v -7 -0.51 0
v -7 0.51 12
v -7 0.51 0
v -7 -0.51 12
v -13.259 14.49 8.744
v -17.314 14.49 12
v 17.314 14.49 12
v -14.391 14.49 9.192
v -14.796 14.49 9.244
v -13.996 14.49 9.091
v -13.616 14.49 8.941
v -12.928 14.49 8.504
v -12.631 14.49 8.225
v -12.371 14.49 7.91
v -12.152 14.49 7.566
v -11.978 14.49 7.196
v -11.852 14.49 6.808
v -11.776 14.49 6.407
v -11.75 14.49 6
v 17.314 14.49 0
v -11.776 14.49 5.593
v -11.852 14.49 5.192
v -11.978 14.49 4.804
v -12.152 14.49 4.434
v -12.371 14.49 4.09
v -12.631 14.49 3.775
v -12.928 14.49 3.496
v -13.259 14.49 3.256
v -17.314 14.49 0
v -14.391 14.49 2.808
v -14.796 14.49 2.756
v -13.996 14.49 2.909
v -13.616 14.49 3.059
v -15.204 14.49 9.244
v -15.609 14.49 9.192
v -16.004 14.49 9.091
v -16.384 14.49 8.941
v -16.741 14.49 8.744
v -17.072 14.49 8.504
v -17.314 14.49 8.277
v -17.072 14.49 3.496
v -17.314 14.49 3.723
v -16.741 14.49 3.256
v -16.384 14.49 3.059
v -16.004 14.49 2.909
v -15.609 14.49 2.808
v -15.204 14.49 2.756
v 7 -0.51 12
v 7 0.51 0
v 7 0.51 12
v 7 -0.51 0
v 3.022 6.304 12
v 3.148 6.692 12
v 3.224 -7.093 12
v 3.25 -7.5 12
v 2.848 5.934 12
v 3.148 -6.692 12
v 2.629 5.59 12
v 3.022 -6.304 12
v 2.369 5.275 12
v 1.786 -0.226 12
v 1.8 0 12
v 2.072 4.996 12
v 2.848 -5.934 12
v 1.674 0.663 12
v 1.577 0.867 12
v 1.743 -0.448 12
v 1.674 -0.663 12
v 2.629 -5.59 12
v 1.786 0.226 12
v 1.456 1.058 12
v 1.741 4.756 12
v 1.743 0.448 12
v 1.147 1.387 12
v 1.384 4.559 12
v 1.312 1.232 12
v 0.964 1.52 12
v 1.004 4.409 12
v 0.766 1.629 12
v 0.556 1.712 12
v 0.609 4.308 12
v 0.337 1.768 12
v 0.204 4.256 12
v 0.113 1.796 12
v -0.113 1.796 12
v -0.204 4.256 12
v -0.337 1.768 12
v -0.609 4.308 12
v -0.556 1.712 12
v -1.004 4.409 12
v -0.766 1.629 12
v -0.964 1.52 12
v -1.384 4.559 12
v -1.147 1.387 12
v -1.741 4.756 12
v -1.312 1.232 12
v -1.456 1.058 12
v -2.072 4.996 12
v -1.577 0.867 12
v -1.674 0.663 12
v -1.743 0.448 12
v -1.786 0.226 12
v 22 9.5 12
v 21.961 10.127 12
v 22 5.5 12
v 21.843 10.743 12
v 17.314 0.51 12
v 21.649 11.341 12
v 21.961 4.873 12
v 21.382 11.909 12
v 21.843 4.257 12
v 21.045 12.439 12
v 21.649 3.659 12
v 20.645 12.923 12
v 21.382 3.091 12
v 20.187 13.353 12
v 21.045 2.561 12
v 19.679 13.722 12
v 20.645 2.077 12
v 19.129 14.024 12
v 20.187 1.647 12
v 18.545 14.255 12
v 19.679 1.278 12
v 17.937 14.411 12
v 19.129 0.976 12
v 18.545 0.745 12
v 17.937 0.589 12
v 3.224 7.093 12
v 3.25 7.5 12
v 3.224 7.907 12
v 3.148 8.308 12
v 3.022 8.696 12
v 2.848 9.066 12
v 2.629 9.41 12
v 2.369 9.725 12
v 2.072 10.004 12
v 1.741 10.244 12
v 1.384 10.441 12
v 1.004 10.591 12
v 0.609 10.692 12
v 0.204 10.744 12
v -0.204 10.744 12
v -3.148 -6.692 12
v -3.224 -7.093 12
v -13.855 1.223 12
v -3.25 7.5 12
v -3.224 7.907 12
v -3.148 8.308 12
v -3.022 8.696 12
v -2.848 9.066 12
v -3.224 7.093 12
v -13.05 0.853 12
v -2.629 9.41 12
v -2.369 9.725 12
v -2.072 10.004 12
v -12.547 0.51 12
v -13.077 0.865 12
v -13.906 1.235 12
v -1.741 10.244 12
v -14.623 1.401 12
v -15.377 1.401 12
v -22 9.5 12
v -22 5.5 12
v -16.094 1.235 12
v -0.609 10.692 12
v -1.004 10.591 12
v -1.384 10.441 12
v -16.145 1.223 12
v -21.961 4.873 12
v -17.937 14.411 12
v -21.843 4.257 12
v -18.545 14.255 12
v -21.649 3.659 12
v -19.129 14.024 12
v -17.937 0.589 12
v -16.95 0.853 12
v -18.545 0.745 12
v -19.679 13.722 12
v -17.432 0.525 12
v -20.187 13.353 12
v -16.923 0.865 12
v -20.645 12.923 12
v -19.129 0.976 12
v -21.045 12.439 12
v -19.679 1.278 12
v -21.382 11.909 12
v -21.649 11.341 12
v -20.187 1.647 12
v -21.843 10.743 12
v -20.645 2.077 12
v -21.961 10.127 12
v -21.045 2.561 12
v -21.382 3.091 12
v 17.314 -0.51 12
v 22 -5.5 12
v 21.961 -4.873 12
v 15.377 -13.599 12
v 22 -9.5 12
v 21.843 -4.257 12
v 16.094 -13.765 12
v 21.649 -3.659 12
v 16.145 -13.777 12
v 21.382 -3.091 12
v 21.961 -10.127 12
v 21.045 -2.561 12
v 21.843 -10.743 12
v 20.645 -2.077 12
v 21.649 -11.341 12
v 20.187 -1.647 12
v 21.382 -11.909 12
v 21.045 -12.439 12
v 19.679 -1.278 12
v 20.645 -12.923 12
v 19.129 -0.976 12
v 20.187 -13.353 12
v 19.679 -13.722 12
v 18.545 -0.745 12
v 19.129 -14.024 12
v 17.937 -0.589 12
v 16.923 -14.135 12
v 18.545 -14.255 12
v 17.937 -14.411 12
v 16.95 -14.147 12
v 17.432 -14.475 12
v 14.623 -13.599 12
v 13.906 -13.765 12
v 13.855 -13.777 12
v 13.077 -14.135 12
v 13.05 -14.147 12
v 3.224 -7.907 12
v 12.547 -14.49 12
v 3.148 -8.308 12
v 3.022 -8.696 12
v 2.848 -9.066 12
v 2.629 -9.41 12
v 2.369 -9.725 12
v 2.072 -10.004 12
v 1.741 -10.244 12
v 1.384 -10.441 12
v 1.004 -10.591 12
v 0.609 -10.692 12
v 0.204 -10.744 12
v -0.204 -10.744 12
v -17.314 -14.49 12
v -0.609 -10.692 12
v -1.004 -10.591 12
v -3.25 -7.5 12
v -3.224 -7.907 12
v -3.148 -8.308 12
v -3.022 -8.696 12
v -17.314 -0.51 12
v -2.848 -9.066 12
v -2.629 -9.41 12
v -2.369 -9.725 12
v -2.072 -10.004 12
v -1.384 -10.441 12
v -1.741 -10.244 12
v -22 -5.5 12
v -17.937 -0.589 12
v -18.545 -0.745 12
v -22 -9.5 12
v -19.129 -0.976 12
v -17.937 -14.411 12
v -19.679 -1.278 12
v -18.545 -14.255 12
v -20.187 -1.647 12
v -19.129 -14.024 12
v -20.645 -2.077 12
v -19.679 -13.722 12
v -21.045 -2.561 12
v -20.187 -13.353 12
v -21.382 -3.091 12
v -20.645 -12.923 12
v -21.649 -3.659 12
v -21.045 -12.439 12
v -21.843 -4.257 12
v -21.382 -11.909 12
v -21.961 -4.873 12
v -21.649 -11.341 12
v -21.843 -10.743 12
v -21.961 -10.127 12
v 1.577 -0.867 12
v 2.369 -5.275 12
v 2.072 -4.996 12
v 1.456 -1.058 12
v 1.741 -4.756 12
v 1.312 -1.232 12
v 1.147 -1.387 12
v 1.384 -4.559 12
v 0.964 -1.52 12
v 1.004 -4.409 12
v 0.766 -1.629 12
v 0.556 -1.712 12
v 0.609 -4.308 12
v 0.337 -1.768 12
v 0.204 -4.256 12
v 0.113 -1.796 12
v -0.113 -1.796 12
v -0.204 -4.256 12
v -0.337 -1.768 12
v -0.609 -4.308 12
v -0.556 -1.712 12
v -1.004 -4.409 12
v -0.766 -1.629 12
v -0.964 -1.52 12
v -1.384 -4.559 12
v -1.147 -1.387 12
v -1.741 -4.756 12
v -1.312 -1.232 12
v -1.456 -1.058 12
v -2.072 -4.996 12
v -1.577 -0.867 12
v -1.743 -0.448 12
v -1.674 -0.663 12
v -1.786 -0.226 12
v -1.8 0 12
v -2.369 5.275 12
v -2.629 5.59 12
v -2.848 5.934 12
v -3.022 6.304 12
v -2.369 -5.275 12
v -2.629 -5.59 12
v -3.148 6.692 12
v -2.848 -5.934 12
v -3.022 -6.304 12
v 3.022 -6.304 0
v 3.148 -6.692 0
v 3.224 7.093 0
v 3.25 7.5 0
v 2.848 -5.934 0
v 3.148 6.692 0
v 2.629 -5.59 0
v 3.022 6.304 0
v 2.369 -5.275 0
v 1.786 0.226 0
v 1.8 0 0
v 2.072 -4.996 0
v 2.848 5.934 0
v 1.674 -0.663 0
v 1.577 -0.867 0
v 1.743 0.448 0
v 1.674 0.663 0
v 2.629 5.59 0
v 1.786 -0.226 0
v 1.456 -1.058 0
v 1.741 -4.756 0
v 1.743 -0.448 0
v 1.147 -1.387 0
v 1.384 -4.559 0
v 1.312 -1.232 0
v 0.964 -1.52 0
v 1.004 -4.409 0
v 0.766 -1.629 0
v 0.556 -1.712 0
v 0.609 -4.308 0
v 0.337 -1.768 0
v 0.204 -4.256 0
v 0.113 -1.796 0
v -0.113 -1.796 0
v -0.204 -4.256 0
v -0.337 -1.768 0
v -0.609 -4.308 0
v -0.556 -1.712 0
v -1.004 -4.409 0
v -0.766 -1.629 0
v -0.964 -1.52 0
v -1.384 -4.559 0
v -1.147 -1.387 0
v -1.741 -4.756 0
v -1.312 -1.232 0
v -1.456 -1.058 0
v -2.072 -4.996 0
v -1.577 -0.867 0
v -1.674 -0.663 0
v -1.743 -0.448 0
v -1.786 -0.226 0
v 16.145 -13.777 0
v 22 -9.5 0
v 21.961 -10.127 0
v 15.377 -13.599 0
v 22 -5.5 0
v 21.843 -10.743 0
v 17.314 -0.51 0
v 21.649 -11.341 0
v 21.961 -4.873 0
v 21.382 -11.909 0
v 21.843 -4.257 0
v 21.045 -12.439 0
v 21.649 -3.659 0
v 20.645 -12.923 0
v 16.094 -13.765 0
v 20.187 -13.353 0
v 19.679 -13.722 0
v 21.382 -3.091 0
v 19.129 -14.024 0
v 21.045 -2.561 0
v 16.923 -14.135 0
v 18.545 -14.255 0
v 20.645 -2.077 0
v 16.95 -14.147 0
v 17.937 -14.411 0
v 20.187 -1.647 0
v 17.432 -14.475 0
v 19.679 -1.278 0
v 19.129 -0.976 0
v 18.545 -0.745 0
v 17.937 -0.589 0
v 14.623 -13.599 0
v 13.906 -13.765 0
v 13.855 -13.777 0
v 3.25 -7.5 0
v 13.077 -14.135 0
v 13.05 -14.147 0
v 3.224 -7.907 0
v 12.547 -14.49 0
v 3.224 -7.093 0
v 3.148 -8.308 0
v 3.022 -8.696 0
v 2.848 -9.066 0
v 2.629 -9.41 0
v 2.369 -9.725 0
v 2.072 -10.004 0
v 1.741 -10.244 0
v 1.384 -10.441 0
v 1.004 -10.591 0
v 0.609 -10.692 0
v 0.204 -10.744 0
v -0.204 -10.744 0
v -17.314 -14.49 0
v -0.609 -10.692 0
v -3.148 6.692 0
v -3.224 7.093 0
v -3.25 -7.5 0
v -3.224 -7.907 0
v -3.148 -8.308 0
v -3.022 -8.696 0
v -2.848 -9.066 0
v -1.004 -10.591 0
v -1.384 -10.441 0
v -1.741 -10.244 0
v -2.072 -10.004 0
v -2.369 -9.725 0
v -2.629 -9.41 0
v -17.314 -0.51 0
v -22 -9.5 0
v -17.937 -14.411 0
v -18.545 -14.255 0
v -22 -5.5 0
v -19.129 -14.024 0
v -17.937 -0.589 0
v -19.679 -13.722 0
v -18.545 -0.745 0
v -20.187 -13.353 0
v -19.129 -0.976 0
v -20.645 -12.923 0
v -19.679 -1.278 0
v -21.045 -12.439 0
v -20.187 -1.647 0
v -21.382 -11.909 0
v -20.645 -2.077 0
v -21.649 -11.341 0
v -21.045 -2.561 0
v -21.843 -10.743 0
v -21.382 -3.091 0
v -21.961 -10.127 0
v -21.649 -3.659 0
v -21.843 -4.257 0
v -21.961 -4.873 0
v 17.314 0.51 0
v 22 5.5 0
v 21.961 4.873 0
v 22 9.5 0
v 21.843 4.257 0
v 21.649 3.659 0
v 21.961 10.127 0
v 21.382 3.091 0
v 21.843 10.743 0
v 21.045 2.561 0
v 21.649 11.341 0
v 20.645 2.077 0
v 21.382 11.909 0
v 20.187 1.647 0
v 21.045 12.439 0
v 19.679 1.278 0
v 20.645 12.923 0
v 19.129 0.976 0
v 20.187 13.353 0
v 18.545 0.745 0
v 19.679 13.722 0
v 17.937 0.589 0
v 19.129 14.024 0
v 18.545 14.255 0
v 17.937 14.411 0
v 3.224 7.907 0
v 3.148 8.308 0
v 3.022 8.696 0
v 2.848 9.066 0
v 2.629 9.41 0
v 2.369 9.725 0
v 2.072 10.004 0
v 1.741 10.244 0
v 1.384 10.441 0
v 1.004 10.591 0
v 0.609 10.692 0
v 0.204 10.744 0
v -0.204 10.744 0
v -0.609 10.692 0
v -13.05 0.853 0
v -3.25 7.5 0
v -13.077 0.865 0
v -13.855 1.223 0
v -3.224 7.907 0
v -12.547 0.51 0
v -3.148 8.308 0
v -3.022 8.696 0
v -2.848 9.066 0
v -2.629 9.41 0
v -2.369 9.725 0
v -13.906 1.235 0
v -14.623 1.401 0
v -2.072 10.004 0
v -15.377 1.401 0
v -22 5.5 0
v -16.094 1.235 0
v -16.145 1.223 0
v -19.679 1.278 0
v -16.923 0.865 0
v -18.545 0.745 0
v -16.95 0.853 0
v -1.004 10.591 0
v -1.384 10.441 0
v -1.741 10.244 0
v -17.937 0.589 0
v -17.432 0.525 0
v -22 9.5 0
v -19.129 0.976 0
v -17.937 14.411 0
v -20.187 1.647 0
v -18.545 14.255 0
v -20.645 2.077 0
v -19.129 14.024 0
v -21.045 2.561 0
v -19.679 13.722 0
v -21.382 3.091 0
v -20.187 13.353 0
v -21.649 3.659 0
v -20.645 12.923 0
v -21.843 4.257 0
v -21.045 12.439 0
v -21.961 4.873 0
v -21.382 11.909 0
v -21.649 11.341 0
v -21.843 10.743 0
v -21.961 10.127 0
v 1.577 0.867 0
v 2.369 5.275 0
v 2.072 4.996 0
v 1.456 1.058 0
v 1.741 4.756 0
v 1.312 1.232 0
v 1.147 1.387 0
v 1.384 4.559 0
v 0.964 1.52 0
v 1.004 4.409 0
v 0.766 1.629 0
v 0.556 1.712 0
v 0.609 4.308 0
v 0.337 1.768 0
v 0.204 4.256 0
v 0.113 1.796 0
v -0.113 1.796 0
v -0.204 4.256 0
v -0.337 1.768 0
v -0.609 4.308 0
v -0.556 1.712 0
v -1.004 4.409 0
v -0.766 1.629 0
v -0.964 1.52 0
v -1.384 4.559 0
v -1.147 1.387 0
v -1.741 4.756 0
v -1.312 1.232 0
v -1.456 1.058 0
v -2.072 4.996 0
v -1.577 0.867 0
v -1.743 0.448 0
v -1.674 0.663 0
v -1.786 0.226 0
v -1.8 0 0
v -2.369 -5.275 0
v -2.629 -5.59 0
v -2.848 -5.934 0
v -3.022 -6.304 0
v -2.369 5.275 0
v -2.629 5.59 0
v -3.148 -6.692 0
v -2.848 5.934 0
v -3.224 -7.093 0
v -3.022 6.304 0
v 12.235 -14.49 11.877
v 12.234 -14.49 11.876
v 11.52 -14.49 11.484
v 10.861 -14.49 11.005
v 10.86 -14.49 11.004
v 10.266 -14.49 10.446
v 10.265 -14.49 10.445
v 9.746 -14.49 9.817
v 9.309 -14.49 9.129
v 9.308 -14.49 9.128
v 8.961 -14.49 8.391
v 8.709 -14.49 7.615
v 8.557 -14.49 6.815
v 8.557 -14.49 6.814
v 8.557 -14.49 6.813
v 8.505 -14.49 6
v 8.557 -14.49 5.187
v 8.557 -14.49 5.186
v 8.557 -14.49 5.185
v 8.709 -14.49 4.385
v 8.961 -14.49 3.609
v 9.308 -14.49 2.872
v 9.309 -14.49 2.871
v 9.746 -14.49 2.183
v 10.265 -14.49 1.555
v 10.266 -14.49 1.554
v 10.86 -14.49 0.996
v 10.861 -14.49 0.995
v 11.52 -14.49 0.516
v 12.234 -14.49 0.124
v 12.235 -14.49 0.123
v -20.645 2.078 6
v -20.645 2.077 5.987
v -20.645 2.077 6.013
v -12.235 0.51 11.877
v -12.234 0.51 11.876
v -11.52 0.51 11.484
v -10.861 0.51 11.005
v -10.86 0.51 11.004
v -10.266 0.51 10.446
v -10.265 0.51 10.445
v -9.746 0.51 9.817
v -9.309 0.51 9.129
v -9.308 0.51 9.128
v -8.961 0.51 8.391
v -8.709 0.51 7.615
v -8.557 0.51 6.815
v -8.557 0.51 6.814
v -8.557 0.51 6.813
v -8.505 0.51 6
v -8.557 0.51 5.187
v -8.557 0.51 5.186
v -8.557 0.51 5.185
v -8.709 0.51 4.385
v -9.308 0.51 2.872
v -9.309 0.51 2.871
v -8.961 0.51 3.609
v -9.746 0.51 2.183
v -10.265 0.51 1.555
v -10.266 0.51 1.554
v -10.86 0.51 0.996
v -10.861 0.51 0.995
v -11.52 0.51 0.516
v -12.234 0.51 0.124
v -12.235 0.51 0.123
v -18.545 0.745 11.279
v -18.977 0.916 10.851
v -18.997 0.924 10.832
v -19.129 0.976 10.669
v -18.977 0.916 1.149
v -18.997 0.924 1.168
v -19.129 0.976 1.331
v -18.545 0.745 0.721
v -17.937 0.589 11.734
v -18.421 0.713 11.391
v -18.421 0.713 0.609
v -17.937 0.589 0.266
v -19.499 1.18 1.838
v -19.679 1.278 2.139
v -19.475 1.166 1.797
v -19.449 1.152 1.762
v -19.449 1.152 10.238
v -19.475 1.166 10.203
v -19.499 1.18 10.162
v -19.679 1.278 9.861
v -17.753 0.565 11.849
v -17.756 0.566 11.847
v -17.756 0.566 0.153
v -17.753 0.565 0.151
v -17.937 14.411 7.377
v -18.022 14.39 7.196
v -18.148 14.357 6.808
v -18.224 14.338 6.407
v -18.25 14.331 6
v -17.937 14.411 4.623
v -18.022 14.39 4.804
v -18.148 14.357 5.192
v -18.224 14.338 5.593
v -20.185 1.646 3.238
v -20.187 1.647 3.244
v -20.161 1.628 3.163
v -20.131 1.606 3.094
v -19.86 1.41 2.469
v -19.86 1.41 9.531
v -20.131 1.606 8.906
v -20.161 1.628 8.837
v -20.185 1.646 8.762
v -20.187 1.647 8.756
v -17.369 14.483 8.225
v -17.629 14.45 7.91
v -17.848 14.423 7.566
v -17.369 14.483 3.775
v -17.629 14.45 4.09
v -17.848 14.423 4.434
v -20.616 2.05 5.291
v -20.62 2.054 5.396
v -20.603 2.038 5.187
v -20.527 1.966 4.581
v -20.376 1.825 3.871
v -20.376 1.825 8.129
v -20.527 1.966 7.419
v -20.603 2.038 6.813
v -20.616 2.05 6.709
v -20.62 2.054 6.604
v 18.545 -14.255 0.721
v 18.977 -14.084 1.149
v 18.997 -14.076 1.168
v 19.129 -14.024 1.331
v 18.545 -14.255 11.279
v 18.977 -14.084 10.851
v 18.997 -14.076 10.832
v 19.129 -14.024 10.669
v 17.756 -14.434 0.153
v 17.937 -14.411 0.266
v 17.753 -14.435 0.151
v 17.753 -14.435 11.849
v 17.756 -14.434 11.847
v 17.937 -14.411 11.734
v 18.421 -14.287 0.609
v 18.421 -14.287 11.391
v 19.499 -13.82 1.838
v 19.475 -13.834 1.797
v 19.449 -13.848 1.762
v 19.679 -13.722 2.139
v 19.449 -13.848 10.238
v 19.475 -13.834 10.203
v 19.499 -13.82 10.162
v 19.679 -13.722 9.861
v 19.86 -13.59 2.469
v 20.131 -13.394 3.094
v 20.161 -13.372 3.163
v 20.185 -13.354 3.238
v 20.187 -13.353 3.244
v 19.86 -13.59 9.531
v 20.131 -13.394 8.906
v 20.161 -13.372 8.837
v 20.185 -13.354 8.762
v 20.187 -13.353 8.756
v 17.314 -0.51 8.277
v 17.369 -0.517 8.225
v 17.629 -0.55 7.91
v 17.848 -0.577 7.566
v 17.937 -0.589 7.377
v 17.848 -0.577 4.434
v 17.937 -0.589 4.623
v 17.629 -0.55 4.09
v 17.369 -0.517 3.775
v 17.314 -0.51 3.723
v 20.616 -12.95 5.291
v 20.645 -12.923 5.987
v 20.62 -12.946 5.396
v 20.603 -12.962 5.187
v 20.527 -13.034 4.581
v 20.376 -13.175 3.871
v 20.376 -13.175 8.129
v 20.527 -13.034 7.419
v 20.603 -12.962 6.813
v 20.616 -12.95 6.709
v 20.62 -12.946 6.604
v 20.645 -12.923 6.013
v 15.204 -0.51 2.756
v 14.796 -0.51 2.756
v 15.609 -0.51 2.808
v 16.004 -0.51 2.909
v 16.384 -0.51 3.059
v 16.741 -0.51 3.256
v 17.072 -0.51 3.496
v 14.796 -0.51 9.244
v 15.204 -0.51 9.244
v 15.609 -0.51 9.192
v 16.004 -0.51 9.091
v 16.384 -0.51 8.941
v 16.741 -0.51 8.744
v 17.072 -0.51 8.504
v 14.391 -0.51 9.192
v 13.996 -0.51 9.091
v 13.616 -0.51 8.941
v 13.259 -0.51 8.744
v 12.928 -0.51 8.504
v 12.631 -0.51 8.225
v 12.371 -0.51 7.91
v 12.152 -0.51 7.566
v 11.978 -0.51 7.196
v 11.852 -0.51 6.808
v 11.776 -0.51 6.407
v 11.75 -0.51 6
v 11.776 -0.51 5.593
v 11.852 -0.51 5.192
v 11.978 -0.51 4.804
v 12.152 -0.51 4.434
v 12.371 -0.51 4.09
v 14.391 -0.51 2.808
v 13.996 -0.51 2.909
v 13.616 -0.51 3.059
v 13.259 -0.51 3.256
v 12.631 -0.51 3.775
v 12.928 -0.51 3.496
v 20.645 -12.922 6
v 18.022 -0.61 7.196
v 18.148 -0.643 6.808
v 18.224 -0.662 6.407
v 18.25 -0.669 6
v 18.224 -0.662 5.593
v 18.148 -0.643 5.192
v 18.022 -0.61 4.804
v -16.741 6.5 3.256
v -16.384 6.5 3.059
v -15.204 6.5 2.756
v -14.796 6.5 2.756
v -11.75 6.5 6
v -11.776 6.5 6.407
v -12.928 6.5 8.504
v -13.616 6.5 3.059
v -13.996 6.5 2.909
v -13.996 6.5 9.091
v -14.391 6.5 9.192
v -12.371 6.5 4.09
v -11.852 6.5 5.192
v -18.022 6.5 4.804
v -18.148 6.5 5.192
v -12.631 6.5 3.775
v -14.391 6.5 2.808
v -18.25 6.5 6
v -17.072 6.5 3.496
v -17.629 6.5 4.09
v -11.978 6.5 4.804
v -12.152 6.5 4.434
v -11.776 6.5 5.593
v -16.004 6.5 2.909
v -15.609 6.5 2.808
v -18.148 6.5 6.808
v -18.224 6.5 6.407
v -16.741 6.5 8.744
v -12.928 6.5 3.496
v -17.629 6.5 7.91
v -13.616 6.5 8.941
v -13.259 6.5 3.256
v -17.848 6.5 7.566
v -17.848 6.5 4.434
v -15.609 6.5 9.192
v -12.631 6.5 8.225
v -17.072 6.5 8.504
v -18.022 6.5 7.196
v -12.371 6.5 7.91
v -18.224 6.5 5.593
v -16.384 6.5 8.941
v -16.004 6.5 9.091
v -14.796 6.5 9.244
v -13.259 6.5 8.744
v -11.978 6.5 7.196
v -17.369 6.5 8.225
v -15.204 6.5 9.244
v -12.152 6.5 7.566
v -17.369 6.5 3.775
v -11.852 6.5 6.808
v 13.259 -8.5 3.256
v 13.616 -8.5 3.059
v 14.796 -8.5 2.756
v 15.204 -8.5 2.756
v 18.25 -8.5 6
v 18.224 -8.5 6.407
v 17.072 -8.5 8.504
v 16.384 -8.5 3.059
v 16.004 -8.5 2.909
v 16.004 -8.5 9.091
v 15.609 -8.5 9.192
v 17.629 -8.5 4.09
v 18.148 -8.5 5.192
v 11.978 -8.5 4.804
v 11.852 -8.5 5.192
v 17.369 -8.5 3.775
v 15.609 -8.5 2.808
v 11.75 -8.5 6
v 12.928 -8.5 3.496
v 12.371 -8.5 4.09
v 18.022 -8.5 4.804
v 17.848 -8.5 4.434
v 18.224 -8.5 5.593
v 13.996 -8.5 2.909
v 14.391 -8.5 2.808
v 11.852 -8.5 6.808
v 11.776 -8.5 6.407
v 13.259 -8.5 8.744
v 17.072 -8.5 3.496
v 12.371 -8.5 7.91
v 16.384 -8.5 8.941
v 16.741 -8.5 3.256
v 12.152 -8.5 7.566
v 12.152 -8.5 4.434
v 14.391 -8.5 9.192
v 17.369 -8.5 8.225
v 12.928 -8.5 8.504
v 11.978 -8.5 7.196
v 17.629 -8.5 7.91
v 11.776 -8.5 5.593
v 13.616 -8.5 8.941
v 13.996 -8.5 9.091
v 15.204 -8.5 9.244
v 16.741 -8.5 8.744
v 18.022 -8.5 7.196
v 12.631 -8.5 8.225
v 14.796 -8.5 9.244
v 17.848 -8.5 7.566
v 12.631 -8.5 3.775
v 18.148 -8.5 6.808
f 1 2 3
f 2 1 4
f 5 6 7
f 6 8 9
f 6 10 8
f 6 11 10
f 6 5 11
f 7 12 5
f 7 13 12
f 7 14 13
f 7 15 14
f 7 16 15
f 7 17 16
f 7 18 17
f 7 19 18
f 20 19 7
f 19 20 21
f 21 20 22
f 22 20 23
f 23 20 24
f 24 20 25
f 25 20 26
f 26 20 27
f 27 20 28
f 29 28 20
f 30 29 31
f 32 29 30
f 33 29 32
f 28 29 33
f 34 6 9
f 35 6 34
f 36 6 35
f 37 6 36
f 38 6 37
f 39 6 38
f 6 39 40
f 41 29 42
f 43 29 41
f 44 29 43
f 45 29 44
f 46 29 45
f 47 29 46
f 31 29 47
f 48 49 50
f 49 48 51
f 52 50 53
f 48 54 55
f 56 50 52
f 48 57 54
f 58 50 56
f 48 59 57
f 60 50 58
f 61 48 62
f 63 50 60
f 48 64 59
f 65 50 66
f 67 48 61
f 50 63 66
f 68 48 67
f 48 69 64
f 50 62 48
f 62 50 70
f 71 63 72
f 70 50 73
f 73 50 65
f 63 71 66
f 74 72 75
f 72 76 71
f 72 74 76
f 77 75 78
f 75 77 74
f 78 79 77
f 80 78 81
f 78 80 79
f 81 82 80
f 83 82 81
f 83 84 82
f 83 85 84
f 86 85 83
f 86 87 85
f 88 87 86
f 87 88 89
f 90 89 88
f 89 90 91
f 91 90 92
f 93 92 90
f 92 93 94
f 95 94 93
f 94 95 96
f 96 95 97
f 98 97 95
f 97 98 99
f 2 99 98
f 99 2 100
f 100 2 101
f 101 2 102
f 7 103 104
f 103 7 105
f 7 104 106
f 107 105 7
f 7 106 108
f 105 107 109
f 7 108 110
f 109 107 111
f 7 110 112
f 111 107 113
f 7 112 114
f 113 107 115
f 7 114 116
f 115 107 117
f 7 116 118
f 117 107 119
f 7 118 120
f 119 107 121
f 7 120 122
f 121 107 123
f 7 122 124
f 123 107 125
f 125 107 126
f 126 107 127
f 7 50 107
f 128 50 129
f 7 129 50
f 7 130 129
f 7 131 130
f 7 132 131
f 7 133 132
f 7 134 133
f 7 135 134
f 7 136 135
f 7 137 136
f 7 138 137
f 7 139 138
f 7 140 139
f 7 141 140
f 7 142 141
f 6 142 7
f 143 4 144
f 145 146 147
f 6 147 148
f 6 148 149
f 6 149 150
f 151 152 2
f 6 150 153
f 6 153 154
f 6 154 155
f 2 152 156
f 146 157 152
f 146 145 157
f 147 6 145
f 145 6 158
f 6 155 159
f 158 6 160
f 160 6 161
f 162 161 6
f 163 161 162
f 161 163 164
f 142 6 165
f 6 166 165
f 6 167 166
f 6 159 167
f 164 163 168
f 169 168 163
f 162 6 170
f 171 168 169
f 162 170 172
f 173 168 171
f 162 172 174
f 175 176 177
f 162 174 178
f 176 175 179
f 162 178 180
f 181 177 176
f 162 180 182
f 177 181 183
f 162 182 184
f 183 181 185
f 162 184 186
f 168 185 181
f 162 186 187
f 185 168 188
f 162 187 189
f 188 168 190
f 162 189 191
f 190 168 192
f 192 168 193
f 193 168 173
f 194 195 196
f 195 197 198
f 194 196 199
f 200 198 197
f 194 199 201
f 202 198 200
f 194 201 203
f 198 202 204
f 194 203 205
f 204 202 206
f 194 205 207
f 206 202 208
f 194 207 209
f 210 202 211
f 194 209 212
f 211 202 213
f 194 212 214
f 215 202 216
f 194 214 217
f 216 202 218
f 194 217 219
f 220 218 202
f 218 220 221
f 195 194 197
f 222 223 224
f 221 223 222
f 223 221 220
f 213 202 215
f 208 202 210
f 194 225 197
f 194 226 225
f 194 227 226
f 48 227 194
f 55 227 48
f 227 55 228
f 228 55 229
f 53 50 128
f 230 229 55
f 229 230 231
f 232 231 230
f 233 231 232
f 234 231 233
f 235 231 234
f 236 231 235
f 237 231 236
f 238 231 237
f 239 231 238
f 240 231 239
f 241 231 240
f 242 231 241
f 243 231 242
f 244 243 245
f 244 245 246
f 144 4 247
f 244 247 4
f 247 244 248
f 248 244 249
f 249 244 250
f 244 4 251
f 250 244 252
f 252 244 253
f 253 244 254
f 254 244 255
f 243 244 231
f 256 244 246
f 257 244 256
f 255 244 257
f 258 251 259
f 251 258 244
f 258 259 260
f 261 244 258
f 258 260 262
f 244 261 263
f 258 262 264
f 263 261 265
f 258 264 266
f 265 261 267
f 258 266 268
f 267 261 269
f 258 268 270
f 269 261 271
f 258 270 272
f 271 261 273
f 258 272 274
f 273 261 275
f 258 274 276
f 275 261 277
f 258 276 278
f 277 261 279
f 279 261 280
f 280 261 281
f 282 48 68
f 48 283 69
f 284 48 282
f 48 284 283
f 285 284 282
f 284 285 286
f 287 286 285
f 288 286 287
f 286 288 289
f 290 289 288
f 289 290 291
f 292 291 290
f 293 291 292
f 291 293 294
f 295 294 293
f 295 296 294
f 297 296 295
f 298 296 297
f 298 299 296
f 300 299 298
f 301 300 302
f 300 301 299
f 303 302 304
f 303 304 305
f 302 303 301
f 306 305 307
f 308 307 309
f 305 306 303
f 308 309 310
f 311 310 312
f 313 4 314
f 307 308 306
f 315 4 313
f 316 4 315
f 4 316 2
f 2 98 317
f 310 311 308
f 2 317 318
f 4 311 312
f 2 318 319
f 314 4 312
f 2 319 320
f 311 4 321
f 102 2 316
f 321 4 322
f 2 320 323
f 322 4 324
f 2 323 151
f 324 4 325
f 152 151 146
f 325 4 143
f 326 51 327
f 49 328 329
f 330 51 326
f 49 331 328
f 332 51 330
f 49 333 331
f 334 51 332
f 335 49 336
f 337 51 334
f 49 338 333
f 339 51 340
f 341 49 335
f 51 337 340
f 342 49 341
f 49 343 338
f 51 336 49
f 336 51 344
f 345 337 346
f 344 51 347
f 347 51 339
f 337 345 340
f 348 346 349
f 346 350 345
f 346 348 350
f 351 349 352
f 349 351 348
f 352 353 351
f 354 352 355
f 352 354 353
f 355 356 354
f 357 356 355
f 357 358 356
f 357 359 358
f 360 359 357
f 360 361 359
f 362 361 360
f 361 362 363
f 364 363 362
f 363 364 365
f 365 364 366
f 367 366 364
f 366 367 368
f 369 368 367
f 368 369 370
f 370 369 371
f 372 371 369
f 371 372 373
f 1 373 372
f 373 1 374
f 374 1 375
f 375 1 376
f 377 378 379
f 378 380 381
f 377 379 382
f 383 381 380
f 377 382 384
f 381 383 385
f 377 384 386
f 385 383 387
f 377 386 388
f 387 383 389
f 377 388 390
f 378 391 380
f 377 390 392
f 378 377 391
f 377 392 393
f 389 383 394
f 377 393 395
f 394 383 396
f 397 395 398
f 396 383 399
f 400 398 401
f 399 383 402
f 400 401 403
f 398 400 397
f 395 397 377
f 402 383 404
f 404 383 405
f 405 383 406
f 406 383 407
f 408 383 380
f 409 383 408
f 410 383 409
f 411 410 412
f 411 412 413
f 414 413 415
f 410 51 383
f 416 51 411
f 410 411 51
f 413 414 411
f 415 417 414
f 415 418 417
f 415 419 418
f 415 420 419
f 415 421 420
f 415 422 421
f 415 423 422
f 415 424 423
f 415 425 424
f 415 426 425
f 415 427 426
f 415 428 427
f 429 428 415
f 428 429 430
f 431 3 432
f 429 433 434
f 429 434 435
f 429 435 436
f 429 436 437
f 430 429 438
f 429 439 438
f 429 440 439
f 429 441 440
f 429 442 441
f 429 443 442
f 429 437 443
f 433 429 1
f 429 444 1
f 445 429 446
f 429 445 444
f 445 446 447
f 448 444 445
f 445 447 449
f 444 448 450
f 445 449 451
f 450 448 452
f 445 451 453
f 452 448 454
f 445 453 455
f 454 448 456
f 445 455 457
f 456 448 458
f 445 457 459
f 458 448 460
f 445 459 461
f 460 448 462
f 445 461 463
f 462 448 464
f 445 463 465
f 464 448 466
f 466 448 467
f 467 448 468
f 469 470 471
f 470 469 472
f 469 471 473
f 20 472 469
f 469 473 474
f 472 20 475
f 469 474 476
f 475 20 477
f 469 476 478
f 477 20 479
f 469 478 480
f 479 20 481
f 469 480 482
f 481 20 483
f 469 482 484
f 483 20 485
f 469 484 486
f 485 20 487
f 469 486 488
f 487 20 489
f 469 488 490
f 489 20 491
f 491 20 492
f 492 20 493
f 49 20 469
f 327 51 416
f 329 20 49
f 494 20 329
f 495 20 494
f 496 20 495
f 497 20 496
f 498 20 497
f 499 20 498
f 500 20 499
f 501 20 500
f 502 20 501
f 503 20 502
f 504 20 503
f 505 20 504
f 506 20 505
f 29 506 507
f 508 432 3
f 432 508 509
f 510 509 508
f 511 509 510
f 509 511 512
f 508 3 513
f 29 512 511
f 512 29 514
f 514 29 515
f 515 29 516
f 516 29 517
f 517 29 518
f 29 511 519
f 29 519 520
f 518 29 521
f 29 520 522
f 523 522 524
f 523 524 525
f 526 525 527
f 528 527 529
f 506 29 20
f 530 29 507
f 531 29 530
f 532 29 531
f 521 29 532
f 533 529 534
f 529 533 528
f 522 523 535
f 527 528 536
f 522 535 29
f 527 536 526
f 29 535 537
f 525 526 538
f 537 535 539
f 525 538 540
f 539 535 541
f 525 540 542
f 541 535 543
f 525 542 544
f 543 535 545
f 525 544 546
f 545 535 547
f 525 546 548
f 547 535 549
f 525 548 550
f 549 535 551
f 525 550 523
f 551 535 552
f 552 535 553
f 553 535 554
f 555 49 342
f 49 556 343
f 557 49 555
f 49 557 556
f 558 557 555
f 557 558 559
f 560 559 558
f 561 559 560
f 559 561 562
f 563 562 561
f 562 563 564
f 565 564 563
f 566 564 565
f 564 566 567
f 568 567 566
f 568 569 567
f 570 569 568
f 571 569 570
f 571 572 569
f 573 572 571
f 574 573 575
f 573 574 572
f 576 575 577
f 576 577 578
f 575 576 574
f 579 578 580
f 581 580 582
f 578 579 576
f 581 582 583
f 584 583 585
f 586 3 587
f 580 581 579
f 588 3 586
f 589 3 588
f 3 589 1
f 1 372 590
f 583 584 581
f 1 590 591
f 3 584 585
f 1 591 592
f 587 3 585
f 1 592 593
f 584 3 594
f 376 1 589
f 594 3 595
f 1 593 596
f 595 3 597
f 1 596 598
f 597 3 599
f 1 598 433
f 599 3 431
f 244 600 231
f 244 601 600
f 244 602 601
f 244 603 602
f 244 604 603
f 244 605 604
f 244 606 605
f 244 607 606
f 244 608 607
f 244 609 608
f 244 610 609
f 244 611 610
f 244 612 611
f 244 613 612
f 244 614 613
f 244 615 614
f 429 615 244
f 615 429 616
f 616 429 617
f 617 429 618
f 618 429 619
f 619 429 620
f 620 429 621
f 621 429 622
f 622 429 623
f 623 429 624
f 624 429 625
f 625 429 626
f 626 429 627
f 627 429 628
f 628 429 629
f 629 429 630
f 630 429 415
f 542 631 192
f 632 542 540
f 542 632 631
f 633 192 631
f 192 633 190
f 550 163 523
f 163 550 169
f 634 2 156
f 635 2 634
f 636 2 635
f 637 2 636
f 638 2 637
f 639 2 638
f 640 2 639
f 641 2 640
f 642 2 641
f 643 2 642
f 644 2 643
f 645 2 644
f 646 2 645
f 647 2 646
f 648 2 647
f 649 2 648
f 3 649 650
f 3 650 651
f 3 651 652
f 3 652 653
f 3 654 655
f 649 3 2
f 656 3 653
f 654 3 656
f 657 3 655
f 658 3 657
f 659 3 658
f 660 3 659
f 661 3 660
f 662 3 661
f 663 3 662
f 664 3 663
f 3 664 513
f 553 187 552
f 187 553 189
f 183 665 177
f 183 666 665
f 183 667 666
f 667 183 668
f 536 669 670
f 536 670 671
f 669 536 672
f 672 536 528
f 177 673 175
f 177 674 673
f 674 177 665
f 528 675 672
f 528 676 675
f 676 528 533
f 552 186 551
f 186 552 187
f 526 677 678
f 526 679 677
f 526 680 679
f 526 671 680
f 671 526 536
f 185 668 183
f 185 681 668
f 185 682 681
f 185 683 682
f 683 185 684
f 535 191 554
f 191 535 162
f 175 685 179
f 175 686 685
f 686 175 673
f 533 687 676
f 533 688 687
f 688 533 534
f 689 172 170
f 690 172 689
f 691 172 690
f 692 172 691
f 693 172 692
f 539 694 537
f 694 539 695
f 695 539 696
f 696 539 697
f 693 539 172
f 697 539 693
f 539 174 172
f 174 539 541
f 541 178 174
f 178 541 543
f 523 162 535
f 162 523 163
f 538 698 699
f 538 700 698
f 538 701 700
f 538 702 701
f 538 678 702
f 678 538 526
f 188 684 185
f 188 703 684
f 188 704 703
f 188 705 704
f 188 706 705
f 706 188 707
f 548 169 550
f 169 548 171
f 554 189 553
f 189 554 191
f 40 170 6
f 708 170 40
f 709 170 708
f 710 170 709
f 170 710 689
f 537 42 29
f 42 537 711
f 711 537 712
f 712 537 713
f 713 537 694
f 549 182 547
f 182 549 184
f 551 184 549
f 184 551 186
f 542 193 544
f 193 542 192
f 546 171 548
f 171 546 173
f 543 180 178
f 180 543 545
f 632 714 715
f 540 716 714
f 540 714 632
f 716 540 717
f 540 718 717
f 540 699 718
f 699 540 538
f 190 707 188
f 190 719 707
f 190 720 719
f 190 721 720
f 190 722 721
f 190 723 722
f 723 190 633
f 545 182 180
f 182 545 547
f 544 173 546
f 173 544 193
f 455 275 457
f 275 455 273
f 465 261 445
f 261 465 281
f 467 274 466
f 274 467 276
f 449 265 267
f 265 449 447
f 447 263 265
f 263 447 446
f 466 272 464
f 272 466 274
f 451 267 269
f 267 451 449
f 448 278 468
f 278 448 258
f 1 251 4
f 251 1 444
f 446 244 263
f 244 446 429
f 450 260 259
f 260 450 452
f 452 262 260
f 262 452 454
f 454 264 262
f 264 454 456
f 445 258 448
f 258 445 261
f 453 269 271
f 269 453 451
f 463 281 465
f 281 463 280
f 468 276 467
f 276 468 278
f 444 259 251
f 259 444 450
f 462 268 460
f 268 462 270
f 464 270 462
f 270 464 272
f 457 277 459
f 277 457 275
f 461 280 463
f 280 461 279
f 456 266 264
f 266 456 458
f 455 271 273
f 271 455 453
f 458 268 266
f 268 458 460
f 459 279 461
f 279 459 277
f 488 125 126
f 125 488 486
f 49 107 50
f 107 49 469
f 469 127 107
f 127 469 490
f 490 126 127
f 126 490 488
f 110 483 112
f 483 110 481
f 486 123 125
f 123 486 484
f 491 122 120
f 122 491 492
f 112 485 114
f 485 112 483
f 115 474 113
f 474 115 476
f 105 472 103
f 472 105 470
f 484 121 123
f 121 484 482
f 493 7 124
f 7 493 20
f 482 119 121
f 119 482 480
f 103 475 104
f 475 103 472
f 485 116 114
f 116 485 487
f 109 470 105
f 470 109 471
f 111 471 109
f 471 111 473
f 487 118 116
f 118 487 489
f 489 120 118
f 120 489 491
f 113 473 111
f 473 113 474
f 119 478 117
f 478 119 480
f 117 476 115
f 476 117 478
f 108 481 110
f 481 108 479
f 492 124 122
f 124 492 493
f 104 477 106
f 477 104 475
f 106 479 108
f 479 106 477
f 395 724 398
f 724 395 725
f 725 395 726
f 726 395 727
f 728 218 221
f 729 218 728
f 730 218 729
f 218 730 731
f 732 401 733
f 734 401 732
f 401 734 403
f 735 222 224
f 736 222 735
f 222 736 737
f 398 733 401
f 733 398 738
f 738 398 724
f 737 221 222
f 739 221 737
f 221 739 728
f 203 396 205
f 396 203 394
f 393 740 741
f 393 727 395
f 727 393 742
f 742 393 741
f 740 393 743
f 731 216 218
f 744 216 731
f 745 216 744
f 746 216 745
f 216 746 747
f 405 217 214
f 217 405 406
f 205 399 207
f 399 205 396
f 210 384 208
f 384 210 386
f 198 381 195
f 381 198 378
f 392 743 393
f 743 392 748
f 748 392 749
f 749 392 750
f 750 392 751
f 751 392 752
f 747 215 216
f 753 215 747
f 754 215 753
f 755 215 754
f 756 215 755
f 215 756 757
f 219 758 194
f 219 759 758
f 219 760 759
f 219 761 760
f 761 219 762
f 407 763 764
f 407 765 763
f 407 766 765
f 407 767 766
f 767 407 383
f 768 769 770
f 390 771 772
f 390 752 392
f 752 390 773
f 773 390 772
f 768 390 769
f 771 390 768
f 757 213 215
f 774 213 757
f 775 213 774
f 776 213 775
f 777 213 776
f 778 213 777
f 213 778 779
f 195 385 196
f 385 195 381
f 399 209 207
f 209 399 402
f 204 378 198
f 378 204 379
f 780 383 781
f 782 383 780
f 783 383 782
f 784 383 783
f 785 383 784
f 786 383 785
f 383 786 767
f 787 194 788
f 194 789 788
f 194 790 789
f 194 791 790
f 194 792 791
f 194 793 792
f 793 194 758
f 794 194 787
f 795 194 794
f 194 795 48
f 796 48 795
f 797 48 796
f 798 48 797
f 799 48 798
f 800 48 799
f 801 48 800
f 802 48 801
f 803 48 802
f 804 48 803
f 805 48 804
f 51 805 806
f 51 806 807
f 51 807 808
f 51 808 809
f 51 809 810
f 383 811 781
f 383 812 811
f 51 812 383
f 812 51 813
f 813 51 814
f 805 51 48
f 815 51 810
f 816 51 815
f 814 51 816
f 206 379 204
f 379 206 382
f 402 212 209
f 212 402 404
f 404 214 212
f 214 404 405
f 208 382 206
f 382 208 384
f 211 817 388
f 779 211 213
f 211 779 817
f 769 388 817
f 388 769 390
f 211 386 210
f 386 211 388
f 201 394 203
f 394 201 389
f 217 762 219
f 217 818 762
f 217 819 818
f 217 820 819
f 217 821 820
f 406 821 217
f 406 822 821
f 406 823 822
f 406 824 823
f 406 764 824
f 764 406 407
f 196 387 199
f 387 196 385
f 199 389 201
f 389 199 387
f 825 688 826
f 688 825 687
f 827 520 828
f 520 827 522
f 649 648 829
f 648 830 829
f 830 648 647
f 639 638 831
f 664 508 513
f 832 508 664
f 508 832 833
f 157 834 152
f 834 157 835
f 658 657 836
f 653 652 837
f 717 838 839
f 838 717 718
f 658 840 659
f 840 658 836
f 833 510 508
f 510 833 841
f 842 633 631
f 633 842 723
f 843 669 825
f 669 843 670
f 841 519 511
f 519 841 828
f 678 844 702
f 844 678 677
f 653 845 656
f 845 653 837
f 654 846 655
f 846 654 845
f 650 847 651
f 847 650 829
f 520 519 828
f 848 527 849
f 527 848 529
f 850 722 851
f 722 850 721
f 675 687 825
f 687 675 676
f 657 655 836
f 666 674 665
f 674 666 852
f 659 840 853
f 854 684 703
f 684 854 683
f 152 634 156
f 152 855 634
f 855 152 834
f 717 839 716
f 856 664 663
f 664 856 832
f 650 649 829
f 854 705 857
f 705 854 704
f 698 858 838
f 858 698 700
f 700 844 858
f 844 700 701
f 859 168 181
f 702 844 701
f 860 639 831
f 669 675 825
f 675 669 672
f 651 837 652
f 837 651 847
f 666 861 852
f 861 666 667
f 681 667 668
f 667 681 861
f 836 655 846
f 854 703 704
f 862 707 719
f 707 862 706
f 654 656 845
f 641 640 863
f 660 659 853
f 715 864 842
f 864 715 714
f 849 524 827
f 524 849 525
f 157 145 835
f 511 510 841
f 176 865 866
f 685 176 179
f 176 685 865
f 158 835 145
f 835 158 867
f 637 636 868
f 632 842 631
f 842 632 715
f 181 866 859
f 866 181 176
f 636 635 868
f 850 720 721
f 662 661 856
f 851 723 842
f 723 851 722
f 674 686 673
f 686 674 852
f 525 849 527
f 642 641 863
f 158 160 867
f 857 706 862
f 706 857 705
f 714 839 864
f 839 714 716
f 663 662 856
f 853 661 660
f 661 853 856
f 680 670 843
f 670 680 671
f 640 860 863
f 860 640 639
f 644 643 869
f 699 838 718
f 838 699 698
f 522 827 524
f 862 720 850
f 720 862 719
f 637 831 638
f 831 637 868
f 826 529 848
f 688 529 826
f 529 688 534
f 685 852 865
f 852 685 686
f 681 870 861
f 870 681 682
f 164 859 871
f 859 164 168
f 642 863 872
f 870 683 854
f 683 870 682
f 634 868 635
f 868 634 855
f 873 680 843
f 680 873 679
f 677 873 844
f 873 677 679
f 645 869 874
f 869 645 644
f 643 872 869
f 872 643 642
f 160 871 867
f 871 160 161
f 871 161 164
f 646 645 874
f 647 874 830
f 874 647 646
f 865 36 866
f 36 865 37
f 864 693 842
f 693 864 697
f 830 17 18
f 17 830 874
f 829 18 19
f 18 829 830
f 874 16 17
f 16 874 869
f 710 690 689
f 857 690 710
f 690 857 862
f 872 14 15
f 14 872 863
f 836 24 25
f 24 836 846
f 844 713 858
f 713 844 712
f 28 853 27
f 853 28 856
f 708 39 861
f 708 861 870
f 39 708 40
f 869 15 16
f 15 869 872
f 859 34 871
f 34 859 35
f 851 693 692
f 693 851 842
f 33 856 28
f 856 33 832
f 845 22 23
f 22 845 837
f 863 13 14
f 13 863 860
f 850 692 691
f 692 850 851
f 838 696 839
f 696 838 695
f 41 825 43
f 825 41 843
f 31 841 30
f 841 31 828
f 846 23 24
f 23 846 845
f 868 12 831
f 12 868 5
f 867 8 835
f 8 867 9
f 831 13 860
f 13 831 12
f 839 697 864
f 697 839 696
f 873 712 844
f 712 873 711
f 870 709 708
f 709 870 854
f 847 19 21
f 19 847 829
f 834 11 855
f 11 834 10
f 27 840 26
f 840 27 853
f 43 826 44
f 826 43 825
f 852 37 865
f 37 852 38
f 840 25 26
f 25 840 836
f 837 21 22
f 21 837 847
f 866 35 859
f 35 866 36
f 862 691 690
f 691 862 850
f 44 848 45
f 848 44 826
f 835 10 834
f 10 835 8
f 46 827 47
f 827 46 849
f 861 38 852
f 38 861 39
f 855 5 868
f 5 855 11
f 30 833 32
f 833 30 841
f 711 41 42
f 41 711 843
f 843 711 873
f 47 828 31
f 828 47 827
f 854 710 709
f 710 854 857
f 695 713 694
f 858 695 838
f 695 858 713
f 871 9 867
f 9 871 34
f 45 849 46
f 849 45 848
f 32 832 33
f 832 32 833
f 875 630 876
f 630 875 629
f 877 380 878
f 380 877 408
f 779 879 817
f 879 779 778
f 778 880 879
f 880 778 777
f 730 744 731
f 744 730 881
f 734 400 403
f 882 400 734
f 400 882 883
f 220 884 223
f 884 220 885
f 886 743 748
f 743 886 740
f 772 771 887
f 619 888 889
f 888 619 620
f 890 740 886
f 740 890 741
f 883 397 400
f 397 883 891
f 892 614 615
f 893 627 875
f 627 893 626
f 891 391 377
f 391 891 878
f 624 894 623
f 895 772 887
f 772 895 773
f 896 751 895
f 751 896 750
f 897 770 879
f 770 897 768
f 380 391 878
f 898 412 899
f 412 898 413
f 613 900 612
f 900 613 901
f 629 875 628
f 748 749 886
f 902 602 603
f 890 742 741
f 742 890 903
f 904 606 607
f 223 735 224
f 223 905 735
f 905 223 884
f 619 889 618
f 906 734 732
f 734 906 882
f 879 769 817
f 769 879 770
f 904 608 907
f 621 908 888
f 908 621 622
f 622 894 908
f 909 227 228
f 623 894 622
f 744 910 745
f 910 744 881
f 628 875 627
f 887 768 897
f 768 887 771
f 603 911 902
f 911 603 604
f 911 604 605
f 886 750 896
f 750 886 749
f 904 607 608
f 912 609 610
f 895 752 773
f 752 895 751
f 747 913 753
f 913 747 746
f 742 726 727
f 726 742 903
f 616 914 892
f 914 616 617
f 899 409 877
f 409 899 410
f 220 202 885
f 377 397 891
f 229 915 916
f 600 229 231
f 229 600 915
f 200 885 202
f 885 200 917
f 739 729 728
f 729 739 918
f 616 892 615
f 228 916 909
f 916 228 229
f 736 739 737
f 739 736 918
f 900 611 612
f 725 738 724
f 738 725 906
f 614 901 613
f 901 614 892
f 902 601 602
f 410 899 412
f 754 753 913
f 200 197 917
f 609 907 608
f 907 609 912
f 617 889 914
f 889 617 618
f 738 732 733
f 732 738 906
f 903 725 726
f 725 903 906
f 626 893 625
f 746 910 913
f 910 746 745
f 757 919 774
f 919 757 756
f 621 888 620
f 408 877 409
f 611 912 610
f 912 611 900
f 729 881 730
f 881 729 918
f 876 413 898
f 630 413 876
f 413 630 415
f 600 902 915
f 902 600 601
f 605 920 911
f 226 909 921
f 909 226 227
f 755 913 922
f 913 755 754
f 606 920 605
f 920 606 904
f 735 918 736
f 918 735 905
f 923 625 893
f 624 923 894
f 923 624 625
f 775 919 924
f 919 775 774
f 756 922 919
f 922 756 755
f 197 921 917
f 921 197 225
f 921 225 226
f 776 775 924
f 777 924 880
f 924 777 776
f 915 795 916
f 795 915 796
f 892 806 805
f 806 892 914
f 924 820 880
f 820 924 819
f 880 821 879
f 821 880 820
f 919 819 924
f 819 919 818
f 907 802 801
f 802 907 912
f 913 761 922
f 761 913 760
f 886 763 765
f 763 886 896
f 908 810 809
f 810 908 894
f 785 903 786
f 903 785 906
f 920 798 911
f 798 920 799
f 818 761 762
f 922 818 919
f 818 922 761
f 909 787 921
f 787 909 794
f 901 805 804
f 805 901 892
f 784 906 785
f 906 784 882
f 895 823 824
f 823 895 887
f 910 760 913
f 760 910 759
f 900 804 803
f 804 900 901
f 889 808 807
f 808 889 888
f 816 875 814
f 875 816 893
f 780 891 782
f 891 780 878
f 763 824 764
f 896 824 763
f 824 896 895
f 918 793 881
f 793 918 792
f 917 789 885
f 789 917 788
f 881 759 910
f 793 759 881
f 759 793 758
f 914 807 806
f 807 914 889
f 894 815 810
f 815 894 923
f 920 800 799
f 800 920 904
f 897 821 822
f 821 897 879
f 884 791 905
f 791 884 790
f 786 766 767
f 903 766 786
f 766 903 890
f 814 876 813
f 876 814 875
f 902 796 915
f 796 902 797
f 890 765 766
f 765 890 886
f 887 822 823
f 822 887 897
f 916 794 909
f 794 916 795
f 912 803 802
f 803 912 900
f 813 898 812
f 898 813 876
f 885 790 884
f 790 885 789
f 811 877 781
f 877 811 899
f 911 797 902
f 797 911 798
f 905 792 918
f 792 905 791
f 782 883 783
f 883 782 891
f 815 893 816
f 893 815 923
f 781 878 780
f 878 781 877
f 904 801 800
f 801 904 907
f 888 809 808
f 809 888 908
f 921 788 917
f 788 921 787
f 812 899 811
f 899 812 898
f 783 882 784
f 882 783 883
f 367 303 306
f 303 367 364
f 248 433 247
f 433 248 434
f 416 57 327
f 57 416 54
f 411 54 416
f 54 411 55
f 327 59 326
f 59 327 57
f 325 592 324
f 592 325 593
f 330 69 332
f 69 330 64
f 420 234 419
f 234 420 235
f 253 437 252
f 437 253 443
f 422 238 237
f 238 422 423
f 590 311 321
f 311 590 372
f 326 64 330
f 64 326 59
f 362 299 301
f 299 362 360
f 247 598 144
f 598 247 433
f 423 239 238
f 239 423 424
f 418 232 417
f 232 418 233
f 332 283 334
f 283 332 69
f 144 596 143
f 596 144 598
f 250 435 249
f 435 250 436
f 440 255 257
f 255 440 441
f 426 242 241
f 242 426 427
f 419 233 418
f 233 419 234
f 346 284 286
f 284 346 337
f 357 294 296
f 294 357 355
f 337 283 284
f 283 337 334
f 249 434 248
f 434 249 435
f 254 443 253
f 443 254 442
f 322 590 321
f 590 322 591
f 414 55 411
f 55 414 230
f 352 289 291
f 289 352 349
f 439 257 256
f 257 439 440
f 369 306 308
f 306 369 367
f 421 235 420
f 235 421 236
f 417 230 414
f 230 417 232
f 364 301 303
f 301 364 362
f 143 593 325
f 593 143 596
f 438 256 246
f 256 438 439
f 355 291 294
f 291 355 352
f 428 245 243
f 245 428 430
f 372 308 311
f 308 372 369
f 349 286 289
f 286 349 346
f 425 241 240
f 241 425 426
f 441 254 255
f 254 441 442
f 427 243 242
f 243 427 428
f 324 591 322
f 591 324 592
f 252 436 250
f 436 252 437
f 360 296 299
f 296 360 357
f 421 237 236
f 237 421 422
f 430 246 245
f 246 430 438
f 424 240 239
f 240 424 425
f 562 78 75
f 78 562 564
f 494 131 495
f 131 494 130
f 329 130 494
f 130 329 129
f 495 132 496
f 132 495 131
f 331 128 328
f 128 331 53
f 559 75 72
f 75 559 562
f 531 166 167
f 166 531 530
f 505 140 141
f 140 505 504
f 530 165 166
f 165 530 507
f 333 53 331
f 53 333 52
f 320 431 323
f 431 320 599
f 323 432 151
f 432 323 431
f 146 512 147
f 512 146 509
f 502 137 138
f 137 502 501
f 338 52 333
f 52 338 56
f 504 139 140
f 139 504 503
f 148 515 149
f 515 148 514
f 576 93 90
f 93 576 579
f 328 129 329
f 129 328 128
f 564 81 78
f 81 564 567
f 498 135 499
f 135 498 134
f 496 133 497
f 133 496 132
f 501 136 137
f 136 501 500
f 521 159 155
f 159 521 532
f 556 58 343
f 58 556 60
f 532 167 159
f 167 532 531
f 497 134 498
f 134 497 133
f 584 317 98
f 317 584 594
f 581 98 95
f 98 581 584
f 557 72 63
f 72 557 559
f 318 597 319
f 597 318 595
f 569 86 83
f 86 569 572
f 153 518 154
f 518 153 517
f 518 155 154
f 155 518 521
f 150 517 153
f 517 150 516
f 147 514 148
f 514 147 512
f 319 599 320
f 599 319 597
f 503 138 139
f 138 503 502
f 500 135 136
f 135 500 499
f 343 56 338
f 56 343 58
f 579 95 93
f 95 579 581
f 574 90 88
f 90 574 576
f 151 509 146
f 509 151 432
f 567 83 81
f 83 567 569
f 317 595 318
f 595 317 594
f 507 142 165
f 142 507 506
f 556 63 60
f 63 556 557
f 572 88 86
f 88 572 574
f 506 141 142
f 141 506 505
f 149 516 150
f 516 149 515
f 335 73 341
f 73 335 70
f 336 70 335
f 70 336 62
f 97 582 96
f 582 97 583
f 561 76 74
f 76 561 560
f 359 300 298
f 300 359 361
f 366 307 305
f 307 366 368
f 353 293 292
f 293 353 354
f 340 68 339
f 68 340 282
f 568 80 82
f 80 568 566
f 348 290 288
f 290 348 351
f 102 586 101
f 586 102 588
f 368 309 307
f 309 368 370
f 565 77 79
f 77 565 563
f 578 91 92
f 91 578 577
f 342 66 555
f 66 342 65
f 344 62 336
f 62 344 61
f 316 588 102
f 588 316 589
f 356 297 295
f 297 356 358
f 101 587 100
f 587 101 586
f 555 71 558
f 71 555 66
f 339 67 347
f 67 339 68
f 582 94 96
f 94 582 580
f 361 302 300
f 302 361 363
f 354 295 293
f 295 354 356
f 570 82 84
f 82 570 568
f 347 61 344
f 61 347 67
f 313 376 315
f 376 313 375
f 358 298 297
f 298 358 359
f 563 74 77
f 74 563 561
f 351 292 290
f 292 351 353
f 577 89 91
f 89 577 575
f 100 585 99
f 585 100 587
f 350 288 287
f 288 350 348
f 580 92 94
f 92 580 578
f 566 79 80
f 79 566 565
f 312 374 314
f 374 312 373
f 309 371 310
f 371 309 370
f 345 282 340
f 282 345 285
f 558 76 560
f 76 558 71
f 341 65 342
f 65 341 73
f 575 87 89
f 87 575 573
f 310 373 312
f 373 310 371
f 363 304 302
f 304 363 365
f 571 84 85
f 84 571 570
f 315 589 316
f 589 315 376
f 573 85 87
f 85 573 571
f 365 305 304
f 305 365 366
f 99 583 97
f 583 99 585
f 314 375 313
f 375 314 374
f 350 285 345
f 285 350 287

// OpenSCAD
$fn = 50;


difference() {
	union() {
		hull() {
			translate(v = [-2.0000000000, 9.5000000000, 0]) {
				cylinder(h = 12, r = 5);
			}
			translate(v = [2.0000000000, 9.5000000000, 0]) {
				cylinder(h = 12, r = 5);
			}
			translate(v = [-2.0000000000, -9.5000000000, 0]) {
				cylinder(h = 12, r = 5);
			}
			translate(v = [2.0000000000, -9.5000000000, 0]) {
				cylinder(h = 12, r = 5);
			}
		}
		translate(v = [-7.5000000000, 7.5000000000, 0]) {
			hull() {
				translate(v = [-9.5000000000, 2.0000000000, 0]) {
					cylinder(h = 12, r = 5);
				}
				translate(v = [9.5000000000, 2.0000000000, 0]) {
					cylinder(h = 12, r = 5);
				}
				translate(v = [-9.5000000000, -2.0000000000, 0]) {
					cylinder(h = 12, r = 5);
				}
				translate(v = [9.5000000000, -2.0000000000, 0]) {
					cylinder(h = 12, r = 5);
				}
			}
		}
		translate(v = [-7.5000000000, -7.5000000000, 0]) {
			hull() {
				translate(v = [-9.5000000000, 2.0000000000, 0]) {
					cylinder(h = 12, r = 5);
				}
				translate(v = [9.5000000000, 2.0000000000, 0]) {
					cylinder(h = 12, r = 5);
				}
				translate(v = [-9.5000000000, -2.0000000000, 0]) {
					cylinder(h = 12, r = 5);
				}
				translate(v = [9.5000000000, -2.0000000000, 0]) {
					cylinder(h = 12, r = 5);
				}
			}
		}
		translate(v = [7.5000000000, 7.5000000000, 0]) {
			hull() {
				translate(v = [-9.5000000000, 2.0000000000, 0]) {
					cylinder(h = 12, r = 5);
				}
				translate(v = [9.5000000000, 2.0000000000, 0]) {
					cylinder(h = 12, r = 5);
				}
				translate(v = [-9.5000000000, -2.0000000000, 0]) {
					cylinder(h = 12, r = 5);
				}
				translate(v = [9.5000000000, -2.0000000000, 0]) {
					cylinder(h = 12, r = 5);
				}
			}
		}
		translate(v = [7.5000000000, -7.5000000000, 0]) {
			hull() {
				translate(v = [-9.5000000000, 2.0000000000, 0]) {
					cylinder(h = 12, r = 5);
				}
				translate(v = [9.5000000000, 2.0000000000, 0]) {
					cylinder(h = 12, r = 5);
				}
				translate(v = [-9.5000000000, -2.0000000000, 0]) {
					cylinder(h = 12, r = 5);
				}
				translate(v = [9.5000000000, -2.0000000000, 0]) {
					cylinder(h = 12, r = 5);
				}
			}
		}
	}
	union() {
		translate(v = [-15.0000000000, 0.5000000000, 6.0000000000]) {
			rotate(a = [90, 0, 0]) {
				difference() {
					union() {
						#translate(v = [0, 0, -14.0000000000]) {
							cylinder(h = 14, r = 2.2500000000);
						}
						#translate(v = [0, 0, -6]) {
							cylinder(h = 6, r1 = 3.2500000000, r2 = 6.5000000000);
						}
						#translate(v = [0, 0, -14.0000000000]) {
							cylinder(h = 14, r = 3.2500000000);
						}
						#translate(v = [0, 0, -14.0000000000]) {
							cylinder(h = 14, r = 2.2500000000);
						}
					}
					union();
				}
			}
		}
		translate(v = [15.0000000000, -14.5000000000, 6.0000000000]) {
			rotate(a = [90, 0, 0]) {
				difference() {
					union() {
						#translate(v = [0, 0, -14.0000000000]) {
							cylinder(h = 14, r = 2.2500000000);
						}
						#translate(v = [0, 0, -6]) {
							cylinder(h = 6, r1 = 3.2500000000, r2 = 6.5000000000);
						}
						#translate(v = [0, 0, -14.0000000000]) {
							cylinder(h = 14, r = 3.2500000000);
						}
						#translate(v = [0, 0, -14.0000000000]) {
							cylinder(h = 14, r = 2.2500000000);
						}
					}
					union();
				}
			}
		}
		translate(v = [0.0000000000, -7.5000000000, 0]) {
			translate(v = [0, 0, -100]) {
				cylinder(h = 200, r = 3.2500000000);
			}
		}
		translate(v = [0.0000000000, 7.5000000000, 0]) {
			translate(v = [0, 0, -100]) {
				cylinder(h = 200, r = 3.2500000000);
			}
		}
		translate(v = [0.0000000000, -7.5000000000, 0]) {
			translate(v = [0, 0, -100]) {
				cylinder(h = 200, r = 1.8000000000);
			}
		}
		translate(v = [0, 0, -100]) {
			cylinder(h = 200, r = 1.8000000000);
		}
		translate(v = [0.0000000000, 7.5000000000, 0]) {
			translate(v = [0, 0, -100]) {
				cylinder(h = 200, r = 1.8000000000);
			}
		}
	}
}
